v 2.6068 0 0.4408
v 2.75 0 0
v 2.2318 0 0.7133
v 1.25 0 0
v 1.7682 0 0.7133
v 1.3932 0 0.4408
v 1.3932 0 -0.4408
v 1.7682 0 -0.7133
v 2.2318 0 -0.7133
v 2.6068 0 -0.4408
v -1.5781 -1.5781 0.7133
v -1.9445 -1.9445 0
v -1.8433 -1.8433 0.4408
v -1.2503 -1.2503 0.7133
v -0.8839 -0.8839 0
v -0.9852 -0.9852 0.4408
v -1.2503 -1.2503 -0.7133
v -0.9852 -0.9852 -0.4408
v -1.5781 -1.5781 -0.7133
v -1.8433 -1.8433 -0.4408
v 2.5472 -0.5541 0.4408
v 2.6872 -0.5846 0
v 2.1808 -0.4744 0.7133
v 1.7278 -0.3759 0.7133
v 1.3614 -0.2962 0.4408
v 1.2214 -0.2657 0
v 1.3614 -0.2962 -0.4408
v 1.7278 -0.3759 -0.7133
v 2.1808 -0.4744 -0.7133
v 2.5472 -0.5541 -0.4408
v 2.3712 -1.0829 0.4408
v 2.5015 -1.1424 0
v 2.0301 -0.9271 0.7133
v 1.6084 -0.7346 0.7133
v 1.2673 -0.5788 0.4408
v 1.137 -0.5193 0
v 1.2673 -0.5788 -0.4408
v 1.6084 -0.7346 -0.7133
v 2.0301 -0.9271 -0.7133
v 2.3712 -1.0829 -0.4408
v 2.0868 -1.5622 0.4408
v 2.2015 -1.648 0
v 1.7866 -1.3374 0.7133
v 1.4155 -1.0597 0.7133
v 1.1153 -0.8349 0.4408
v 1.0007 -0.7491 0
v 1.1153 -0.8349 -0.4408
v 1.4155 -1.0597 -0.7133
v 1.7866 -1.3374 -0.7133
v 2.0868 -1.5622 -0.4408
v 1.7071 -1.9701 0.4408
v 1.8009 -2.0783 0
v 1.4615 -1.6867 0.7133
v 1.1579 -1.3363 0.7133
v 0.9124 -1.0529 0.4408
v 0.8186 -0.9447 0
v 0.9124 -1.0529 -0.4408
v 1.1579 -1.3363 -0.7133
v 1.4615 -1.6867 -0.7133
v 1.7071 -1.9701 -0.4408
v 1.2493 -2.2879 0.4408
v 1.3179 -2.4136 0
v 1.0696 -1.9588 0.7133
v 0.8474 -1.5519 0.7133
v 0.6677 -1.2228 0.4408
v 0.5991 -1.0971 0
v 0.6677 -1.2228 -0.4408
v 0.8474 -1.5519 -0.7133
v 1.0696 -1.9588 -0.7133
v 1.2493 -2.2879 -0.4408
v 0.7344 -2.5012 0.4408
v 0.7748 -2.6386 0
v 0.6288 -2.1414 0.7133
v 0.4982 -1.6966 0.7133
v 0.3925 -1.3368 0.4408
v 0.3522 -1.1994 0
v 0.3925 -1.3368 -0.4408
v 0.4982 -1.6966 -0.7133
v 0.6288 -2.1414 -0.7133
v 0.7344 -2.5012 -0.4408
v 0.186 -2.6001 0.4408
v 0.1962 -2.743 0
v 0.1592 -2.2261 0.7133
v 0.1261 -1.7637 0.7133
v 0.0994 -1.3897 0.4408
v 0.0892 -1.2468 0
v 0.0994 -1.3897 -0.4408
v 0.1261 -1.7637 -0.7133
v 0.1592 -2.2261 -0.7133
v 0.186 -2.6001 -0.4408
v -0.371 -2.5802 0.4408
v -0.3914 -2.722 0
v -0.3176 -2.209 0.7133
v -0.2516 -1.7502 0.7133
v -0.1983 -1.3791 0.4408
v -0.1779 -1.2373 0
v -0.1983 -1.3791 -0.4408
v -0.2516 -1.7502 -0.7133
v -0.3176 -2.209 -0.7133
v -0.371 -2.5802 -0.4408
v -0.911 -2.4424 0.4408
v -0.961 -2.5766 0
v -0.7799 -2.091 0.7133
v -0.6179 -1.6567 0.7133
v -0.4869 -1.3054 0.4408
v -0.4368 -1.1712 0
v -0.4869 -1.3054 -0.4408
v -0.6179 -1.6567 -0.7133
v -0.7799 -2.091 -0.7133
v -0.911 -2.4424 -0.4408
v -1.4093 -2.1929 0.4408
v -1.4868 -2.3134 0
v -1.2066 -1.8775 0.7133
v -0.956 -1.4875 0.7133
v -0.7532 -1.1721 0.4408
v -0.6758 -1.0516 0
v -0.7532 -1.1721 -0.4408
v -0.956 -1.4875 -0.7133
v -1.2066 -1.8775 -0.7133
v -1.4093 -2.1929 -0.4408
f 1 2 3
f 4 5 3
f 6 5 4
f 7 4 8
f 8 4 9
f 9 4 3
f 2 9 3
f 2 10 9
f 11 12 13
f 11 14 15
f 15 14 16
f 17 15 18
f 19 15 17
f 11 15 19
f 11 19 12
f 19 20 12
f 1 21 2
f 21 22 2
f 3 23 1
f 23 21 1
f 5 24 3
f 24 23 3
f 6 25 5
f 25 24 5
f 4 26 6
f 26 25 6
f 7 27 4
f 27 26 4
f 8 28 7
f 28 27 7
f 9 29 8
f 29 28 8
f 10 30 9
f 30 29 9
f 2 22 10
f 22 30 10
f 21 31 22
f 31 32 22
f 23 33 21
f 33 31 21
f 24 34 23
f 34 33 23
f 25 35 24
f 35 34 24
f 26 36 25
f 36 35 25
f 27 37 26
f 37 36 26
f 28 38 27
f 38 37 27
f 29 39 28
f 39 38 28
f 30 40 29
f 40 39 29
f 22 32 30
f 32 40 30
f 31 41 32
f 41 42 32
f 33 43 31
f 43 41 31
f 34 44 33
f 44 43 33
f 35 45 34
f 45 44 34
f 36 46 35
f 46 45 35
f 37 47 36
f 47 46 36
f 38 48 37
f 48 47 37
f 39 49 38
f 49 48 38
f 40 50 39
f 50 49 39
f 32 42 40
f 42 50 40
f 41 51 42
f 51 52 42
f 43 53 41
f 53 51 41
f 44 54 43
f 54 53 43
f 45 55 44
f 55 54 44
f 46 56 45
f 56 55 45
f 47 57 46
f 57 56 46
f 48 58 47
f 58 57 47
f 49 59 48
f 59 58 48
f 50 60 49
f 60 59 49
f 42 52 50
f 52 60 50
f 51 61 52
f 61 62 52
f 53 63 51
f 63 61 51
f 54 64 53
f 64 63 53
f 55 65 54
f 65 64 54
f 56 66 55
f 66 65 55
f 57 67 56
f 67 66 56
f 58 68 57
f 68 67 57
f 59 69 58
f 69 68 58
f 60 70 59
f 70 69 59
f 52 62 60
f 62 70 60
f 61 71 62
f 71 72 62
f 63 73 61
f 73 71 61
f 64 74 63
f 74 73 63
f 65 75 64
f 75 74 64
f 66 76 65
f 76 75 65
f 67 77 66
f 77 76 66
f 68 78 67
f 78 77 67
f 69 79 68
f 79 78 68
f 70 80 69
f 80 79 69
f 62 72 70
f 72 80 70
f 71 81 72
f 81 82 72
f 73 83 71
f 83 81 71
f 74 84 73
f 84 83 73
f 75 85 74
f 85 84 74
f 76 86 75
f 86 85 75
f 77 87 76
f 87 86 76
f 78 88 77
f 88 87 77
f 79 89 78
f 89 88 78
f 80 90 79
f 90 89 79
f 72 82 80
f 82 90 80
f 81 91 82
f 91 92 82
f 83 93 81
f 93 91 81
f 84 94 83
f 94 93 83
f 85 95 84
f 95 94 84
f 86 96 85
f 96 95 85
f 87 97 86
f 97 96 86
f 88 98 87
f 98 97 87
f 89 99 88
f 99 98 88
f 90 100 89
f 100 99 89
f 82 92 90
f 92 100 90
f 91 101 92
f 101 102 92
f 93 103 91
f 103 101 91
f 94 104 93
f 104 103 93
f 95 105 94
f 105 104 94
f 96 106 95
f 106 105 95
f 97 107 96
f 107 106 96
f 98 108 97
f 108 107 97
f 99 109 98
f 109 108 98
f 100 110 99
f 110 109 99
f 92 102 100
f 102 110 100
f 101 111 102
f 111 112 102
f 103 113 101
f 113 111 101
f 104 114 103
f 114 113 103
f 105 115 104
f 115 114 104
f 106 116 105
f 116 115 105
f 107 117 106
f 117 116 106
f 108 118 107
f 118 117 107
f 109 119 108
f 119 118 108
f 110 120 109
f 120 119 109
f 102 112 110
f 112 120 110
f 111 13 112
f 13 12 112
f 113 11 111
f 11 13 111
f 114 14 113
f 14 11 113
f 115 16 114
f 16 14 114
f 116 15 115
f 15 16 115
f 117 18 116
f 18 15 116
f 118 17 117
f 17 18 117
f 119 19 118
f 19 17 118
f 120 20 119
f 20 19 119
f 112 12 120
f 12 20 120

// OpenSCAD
// negative angle
rotate_extrude(angle = -135, $fn = 30) translate([2, 0]) circle(0.75, $fn = 10);
